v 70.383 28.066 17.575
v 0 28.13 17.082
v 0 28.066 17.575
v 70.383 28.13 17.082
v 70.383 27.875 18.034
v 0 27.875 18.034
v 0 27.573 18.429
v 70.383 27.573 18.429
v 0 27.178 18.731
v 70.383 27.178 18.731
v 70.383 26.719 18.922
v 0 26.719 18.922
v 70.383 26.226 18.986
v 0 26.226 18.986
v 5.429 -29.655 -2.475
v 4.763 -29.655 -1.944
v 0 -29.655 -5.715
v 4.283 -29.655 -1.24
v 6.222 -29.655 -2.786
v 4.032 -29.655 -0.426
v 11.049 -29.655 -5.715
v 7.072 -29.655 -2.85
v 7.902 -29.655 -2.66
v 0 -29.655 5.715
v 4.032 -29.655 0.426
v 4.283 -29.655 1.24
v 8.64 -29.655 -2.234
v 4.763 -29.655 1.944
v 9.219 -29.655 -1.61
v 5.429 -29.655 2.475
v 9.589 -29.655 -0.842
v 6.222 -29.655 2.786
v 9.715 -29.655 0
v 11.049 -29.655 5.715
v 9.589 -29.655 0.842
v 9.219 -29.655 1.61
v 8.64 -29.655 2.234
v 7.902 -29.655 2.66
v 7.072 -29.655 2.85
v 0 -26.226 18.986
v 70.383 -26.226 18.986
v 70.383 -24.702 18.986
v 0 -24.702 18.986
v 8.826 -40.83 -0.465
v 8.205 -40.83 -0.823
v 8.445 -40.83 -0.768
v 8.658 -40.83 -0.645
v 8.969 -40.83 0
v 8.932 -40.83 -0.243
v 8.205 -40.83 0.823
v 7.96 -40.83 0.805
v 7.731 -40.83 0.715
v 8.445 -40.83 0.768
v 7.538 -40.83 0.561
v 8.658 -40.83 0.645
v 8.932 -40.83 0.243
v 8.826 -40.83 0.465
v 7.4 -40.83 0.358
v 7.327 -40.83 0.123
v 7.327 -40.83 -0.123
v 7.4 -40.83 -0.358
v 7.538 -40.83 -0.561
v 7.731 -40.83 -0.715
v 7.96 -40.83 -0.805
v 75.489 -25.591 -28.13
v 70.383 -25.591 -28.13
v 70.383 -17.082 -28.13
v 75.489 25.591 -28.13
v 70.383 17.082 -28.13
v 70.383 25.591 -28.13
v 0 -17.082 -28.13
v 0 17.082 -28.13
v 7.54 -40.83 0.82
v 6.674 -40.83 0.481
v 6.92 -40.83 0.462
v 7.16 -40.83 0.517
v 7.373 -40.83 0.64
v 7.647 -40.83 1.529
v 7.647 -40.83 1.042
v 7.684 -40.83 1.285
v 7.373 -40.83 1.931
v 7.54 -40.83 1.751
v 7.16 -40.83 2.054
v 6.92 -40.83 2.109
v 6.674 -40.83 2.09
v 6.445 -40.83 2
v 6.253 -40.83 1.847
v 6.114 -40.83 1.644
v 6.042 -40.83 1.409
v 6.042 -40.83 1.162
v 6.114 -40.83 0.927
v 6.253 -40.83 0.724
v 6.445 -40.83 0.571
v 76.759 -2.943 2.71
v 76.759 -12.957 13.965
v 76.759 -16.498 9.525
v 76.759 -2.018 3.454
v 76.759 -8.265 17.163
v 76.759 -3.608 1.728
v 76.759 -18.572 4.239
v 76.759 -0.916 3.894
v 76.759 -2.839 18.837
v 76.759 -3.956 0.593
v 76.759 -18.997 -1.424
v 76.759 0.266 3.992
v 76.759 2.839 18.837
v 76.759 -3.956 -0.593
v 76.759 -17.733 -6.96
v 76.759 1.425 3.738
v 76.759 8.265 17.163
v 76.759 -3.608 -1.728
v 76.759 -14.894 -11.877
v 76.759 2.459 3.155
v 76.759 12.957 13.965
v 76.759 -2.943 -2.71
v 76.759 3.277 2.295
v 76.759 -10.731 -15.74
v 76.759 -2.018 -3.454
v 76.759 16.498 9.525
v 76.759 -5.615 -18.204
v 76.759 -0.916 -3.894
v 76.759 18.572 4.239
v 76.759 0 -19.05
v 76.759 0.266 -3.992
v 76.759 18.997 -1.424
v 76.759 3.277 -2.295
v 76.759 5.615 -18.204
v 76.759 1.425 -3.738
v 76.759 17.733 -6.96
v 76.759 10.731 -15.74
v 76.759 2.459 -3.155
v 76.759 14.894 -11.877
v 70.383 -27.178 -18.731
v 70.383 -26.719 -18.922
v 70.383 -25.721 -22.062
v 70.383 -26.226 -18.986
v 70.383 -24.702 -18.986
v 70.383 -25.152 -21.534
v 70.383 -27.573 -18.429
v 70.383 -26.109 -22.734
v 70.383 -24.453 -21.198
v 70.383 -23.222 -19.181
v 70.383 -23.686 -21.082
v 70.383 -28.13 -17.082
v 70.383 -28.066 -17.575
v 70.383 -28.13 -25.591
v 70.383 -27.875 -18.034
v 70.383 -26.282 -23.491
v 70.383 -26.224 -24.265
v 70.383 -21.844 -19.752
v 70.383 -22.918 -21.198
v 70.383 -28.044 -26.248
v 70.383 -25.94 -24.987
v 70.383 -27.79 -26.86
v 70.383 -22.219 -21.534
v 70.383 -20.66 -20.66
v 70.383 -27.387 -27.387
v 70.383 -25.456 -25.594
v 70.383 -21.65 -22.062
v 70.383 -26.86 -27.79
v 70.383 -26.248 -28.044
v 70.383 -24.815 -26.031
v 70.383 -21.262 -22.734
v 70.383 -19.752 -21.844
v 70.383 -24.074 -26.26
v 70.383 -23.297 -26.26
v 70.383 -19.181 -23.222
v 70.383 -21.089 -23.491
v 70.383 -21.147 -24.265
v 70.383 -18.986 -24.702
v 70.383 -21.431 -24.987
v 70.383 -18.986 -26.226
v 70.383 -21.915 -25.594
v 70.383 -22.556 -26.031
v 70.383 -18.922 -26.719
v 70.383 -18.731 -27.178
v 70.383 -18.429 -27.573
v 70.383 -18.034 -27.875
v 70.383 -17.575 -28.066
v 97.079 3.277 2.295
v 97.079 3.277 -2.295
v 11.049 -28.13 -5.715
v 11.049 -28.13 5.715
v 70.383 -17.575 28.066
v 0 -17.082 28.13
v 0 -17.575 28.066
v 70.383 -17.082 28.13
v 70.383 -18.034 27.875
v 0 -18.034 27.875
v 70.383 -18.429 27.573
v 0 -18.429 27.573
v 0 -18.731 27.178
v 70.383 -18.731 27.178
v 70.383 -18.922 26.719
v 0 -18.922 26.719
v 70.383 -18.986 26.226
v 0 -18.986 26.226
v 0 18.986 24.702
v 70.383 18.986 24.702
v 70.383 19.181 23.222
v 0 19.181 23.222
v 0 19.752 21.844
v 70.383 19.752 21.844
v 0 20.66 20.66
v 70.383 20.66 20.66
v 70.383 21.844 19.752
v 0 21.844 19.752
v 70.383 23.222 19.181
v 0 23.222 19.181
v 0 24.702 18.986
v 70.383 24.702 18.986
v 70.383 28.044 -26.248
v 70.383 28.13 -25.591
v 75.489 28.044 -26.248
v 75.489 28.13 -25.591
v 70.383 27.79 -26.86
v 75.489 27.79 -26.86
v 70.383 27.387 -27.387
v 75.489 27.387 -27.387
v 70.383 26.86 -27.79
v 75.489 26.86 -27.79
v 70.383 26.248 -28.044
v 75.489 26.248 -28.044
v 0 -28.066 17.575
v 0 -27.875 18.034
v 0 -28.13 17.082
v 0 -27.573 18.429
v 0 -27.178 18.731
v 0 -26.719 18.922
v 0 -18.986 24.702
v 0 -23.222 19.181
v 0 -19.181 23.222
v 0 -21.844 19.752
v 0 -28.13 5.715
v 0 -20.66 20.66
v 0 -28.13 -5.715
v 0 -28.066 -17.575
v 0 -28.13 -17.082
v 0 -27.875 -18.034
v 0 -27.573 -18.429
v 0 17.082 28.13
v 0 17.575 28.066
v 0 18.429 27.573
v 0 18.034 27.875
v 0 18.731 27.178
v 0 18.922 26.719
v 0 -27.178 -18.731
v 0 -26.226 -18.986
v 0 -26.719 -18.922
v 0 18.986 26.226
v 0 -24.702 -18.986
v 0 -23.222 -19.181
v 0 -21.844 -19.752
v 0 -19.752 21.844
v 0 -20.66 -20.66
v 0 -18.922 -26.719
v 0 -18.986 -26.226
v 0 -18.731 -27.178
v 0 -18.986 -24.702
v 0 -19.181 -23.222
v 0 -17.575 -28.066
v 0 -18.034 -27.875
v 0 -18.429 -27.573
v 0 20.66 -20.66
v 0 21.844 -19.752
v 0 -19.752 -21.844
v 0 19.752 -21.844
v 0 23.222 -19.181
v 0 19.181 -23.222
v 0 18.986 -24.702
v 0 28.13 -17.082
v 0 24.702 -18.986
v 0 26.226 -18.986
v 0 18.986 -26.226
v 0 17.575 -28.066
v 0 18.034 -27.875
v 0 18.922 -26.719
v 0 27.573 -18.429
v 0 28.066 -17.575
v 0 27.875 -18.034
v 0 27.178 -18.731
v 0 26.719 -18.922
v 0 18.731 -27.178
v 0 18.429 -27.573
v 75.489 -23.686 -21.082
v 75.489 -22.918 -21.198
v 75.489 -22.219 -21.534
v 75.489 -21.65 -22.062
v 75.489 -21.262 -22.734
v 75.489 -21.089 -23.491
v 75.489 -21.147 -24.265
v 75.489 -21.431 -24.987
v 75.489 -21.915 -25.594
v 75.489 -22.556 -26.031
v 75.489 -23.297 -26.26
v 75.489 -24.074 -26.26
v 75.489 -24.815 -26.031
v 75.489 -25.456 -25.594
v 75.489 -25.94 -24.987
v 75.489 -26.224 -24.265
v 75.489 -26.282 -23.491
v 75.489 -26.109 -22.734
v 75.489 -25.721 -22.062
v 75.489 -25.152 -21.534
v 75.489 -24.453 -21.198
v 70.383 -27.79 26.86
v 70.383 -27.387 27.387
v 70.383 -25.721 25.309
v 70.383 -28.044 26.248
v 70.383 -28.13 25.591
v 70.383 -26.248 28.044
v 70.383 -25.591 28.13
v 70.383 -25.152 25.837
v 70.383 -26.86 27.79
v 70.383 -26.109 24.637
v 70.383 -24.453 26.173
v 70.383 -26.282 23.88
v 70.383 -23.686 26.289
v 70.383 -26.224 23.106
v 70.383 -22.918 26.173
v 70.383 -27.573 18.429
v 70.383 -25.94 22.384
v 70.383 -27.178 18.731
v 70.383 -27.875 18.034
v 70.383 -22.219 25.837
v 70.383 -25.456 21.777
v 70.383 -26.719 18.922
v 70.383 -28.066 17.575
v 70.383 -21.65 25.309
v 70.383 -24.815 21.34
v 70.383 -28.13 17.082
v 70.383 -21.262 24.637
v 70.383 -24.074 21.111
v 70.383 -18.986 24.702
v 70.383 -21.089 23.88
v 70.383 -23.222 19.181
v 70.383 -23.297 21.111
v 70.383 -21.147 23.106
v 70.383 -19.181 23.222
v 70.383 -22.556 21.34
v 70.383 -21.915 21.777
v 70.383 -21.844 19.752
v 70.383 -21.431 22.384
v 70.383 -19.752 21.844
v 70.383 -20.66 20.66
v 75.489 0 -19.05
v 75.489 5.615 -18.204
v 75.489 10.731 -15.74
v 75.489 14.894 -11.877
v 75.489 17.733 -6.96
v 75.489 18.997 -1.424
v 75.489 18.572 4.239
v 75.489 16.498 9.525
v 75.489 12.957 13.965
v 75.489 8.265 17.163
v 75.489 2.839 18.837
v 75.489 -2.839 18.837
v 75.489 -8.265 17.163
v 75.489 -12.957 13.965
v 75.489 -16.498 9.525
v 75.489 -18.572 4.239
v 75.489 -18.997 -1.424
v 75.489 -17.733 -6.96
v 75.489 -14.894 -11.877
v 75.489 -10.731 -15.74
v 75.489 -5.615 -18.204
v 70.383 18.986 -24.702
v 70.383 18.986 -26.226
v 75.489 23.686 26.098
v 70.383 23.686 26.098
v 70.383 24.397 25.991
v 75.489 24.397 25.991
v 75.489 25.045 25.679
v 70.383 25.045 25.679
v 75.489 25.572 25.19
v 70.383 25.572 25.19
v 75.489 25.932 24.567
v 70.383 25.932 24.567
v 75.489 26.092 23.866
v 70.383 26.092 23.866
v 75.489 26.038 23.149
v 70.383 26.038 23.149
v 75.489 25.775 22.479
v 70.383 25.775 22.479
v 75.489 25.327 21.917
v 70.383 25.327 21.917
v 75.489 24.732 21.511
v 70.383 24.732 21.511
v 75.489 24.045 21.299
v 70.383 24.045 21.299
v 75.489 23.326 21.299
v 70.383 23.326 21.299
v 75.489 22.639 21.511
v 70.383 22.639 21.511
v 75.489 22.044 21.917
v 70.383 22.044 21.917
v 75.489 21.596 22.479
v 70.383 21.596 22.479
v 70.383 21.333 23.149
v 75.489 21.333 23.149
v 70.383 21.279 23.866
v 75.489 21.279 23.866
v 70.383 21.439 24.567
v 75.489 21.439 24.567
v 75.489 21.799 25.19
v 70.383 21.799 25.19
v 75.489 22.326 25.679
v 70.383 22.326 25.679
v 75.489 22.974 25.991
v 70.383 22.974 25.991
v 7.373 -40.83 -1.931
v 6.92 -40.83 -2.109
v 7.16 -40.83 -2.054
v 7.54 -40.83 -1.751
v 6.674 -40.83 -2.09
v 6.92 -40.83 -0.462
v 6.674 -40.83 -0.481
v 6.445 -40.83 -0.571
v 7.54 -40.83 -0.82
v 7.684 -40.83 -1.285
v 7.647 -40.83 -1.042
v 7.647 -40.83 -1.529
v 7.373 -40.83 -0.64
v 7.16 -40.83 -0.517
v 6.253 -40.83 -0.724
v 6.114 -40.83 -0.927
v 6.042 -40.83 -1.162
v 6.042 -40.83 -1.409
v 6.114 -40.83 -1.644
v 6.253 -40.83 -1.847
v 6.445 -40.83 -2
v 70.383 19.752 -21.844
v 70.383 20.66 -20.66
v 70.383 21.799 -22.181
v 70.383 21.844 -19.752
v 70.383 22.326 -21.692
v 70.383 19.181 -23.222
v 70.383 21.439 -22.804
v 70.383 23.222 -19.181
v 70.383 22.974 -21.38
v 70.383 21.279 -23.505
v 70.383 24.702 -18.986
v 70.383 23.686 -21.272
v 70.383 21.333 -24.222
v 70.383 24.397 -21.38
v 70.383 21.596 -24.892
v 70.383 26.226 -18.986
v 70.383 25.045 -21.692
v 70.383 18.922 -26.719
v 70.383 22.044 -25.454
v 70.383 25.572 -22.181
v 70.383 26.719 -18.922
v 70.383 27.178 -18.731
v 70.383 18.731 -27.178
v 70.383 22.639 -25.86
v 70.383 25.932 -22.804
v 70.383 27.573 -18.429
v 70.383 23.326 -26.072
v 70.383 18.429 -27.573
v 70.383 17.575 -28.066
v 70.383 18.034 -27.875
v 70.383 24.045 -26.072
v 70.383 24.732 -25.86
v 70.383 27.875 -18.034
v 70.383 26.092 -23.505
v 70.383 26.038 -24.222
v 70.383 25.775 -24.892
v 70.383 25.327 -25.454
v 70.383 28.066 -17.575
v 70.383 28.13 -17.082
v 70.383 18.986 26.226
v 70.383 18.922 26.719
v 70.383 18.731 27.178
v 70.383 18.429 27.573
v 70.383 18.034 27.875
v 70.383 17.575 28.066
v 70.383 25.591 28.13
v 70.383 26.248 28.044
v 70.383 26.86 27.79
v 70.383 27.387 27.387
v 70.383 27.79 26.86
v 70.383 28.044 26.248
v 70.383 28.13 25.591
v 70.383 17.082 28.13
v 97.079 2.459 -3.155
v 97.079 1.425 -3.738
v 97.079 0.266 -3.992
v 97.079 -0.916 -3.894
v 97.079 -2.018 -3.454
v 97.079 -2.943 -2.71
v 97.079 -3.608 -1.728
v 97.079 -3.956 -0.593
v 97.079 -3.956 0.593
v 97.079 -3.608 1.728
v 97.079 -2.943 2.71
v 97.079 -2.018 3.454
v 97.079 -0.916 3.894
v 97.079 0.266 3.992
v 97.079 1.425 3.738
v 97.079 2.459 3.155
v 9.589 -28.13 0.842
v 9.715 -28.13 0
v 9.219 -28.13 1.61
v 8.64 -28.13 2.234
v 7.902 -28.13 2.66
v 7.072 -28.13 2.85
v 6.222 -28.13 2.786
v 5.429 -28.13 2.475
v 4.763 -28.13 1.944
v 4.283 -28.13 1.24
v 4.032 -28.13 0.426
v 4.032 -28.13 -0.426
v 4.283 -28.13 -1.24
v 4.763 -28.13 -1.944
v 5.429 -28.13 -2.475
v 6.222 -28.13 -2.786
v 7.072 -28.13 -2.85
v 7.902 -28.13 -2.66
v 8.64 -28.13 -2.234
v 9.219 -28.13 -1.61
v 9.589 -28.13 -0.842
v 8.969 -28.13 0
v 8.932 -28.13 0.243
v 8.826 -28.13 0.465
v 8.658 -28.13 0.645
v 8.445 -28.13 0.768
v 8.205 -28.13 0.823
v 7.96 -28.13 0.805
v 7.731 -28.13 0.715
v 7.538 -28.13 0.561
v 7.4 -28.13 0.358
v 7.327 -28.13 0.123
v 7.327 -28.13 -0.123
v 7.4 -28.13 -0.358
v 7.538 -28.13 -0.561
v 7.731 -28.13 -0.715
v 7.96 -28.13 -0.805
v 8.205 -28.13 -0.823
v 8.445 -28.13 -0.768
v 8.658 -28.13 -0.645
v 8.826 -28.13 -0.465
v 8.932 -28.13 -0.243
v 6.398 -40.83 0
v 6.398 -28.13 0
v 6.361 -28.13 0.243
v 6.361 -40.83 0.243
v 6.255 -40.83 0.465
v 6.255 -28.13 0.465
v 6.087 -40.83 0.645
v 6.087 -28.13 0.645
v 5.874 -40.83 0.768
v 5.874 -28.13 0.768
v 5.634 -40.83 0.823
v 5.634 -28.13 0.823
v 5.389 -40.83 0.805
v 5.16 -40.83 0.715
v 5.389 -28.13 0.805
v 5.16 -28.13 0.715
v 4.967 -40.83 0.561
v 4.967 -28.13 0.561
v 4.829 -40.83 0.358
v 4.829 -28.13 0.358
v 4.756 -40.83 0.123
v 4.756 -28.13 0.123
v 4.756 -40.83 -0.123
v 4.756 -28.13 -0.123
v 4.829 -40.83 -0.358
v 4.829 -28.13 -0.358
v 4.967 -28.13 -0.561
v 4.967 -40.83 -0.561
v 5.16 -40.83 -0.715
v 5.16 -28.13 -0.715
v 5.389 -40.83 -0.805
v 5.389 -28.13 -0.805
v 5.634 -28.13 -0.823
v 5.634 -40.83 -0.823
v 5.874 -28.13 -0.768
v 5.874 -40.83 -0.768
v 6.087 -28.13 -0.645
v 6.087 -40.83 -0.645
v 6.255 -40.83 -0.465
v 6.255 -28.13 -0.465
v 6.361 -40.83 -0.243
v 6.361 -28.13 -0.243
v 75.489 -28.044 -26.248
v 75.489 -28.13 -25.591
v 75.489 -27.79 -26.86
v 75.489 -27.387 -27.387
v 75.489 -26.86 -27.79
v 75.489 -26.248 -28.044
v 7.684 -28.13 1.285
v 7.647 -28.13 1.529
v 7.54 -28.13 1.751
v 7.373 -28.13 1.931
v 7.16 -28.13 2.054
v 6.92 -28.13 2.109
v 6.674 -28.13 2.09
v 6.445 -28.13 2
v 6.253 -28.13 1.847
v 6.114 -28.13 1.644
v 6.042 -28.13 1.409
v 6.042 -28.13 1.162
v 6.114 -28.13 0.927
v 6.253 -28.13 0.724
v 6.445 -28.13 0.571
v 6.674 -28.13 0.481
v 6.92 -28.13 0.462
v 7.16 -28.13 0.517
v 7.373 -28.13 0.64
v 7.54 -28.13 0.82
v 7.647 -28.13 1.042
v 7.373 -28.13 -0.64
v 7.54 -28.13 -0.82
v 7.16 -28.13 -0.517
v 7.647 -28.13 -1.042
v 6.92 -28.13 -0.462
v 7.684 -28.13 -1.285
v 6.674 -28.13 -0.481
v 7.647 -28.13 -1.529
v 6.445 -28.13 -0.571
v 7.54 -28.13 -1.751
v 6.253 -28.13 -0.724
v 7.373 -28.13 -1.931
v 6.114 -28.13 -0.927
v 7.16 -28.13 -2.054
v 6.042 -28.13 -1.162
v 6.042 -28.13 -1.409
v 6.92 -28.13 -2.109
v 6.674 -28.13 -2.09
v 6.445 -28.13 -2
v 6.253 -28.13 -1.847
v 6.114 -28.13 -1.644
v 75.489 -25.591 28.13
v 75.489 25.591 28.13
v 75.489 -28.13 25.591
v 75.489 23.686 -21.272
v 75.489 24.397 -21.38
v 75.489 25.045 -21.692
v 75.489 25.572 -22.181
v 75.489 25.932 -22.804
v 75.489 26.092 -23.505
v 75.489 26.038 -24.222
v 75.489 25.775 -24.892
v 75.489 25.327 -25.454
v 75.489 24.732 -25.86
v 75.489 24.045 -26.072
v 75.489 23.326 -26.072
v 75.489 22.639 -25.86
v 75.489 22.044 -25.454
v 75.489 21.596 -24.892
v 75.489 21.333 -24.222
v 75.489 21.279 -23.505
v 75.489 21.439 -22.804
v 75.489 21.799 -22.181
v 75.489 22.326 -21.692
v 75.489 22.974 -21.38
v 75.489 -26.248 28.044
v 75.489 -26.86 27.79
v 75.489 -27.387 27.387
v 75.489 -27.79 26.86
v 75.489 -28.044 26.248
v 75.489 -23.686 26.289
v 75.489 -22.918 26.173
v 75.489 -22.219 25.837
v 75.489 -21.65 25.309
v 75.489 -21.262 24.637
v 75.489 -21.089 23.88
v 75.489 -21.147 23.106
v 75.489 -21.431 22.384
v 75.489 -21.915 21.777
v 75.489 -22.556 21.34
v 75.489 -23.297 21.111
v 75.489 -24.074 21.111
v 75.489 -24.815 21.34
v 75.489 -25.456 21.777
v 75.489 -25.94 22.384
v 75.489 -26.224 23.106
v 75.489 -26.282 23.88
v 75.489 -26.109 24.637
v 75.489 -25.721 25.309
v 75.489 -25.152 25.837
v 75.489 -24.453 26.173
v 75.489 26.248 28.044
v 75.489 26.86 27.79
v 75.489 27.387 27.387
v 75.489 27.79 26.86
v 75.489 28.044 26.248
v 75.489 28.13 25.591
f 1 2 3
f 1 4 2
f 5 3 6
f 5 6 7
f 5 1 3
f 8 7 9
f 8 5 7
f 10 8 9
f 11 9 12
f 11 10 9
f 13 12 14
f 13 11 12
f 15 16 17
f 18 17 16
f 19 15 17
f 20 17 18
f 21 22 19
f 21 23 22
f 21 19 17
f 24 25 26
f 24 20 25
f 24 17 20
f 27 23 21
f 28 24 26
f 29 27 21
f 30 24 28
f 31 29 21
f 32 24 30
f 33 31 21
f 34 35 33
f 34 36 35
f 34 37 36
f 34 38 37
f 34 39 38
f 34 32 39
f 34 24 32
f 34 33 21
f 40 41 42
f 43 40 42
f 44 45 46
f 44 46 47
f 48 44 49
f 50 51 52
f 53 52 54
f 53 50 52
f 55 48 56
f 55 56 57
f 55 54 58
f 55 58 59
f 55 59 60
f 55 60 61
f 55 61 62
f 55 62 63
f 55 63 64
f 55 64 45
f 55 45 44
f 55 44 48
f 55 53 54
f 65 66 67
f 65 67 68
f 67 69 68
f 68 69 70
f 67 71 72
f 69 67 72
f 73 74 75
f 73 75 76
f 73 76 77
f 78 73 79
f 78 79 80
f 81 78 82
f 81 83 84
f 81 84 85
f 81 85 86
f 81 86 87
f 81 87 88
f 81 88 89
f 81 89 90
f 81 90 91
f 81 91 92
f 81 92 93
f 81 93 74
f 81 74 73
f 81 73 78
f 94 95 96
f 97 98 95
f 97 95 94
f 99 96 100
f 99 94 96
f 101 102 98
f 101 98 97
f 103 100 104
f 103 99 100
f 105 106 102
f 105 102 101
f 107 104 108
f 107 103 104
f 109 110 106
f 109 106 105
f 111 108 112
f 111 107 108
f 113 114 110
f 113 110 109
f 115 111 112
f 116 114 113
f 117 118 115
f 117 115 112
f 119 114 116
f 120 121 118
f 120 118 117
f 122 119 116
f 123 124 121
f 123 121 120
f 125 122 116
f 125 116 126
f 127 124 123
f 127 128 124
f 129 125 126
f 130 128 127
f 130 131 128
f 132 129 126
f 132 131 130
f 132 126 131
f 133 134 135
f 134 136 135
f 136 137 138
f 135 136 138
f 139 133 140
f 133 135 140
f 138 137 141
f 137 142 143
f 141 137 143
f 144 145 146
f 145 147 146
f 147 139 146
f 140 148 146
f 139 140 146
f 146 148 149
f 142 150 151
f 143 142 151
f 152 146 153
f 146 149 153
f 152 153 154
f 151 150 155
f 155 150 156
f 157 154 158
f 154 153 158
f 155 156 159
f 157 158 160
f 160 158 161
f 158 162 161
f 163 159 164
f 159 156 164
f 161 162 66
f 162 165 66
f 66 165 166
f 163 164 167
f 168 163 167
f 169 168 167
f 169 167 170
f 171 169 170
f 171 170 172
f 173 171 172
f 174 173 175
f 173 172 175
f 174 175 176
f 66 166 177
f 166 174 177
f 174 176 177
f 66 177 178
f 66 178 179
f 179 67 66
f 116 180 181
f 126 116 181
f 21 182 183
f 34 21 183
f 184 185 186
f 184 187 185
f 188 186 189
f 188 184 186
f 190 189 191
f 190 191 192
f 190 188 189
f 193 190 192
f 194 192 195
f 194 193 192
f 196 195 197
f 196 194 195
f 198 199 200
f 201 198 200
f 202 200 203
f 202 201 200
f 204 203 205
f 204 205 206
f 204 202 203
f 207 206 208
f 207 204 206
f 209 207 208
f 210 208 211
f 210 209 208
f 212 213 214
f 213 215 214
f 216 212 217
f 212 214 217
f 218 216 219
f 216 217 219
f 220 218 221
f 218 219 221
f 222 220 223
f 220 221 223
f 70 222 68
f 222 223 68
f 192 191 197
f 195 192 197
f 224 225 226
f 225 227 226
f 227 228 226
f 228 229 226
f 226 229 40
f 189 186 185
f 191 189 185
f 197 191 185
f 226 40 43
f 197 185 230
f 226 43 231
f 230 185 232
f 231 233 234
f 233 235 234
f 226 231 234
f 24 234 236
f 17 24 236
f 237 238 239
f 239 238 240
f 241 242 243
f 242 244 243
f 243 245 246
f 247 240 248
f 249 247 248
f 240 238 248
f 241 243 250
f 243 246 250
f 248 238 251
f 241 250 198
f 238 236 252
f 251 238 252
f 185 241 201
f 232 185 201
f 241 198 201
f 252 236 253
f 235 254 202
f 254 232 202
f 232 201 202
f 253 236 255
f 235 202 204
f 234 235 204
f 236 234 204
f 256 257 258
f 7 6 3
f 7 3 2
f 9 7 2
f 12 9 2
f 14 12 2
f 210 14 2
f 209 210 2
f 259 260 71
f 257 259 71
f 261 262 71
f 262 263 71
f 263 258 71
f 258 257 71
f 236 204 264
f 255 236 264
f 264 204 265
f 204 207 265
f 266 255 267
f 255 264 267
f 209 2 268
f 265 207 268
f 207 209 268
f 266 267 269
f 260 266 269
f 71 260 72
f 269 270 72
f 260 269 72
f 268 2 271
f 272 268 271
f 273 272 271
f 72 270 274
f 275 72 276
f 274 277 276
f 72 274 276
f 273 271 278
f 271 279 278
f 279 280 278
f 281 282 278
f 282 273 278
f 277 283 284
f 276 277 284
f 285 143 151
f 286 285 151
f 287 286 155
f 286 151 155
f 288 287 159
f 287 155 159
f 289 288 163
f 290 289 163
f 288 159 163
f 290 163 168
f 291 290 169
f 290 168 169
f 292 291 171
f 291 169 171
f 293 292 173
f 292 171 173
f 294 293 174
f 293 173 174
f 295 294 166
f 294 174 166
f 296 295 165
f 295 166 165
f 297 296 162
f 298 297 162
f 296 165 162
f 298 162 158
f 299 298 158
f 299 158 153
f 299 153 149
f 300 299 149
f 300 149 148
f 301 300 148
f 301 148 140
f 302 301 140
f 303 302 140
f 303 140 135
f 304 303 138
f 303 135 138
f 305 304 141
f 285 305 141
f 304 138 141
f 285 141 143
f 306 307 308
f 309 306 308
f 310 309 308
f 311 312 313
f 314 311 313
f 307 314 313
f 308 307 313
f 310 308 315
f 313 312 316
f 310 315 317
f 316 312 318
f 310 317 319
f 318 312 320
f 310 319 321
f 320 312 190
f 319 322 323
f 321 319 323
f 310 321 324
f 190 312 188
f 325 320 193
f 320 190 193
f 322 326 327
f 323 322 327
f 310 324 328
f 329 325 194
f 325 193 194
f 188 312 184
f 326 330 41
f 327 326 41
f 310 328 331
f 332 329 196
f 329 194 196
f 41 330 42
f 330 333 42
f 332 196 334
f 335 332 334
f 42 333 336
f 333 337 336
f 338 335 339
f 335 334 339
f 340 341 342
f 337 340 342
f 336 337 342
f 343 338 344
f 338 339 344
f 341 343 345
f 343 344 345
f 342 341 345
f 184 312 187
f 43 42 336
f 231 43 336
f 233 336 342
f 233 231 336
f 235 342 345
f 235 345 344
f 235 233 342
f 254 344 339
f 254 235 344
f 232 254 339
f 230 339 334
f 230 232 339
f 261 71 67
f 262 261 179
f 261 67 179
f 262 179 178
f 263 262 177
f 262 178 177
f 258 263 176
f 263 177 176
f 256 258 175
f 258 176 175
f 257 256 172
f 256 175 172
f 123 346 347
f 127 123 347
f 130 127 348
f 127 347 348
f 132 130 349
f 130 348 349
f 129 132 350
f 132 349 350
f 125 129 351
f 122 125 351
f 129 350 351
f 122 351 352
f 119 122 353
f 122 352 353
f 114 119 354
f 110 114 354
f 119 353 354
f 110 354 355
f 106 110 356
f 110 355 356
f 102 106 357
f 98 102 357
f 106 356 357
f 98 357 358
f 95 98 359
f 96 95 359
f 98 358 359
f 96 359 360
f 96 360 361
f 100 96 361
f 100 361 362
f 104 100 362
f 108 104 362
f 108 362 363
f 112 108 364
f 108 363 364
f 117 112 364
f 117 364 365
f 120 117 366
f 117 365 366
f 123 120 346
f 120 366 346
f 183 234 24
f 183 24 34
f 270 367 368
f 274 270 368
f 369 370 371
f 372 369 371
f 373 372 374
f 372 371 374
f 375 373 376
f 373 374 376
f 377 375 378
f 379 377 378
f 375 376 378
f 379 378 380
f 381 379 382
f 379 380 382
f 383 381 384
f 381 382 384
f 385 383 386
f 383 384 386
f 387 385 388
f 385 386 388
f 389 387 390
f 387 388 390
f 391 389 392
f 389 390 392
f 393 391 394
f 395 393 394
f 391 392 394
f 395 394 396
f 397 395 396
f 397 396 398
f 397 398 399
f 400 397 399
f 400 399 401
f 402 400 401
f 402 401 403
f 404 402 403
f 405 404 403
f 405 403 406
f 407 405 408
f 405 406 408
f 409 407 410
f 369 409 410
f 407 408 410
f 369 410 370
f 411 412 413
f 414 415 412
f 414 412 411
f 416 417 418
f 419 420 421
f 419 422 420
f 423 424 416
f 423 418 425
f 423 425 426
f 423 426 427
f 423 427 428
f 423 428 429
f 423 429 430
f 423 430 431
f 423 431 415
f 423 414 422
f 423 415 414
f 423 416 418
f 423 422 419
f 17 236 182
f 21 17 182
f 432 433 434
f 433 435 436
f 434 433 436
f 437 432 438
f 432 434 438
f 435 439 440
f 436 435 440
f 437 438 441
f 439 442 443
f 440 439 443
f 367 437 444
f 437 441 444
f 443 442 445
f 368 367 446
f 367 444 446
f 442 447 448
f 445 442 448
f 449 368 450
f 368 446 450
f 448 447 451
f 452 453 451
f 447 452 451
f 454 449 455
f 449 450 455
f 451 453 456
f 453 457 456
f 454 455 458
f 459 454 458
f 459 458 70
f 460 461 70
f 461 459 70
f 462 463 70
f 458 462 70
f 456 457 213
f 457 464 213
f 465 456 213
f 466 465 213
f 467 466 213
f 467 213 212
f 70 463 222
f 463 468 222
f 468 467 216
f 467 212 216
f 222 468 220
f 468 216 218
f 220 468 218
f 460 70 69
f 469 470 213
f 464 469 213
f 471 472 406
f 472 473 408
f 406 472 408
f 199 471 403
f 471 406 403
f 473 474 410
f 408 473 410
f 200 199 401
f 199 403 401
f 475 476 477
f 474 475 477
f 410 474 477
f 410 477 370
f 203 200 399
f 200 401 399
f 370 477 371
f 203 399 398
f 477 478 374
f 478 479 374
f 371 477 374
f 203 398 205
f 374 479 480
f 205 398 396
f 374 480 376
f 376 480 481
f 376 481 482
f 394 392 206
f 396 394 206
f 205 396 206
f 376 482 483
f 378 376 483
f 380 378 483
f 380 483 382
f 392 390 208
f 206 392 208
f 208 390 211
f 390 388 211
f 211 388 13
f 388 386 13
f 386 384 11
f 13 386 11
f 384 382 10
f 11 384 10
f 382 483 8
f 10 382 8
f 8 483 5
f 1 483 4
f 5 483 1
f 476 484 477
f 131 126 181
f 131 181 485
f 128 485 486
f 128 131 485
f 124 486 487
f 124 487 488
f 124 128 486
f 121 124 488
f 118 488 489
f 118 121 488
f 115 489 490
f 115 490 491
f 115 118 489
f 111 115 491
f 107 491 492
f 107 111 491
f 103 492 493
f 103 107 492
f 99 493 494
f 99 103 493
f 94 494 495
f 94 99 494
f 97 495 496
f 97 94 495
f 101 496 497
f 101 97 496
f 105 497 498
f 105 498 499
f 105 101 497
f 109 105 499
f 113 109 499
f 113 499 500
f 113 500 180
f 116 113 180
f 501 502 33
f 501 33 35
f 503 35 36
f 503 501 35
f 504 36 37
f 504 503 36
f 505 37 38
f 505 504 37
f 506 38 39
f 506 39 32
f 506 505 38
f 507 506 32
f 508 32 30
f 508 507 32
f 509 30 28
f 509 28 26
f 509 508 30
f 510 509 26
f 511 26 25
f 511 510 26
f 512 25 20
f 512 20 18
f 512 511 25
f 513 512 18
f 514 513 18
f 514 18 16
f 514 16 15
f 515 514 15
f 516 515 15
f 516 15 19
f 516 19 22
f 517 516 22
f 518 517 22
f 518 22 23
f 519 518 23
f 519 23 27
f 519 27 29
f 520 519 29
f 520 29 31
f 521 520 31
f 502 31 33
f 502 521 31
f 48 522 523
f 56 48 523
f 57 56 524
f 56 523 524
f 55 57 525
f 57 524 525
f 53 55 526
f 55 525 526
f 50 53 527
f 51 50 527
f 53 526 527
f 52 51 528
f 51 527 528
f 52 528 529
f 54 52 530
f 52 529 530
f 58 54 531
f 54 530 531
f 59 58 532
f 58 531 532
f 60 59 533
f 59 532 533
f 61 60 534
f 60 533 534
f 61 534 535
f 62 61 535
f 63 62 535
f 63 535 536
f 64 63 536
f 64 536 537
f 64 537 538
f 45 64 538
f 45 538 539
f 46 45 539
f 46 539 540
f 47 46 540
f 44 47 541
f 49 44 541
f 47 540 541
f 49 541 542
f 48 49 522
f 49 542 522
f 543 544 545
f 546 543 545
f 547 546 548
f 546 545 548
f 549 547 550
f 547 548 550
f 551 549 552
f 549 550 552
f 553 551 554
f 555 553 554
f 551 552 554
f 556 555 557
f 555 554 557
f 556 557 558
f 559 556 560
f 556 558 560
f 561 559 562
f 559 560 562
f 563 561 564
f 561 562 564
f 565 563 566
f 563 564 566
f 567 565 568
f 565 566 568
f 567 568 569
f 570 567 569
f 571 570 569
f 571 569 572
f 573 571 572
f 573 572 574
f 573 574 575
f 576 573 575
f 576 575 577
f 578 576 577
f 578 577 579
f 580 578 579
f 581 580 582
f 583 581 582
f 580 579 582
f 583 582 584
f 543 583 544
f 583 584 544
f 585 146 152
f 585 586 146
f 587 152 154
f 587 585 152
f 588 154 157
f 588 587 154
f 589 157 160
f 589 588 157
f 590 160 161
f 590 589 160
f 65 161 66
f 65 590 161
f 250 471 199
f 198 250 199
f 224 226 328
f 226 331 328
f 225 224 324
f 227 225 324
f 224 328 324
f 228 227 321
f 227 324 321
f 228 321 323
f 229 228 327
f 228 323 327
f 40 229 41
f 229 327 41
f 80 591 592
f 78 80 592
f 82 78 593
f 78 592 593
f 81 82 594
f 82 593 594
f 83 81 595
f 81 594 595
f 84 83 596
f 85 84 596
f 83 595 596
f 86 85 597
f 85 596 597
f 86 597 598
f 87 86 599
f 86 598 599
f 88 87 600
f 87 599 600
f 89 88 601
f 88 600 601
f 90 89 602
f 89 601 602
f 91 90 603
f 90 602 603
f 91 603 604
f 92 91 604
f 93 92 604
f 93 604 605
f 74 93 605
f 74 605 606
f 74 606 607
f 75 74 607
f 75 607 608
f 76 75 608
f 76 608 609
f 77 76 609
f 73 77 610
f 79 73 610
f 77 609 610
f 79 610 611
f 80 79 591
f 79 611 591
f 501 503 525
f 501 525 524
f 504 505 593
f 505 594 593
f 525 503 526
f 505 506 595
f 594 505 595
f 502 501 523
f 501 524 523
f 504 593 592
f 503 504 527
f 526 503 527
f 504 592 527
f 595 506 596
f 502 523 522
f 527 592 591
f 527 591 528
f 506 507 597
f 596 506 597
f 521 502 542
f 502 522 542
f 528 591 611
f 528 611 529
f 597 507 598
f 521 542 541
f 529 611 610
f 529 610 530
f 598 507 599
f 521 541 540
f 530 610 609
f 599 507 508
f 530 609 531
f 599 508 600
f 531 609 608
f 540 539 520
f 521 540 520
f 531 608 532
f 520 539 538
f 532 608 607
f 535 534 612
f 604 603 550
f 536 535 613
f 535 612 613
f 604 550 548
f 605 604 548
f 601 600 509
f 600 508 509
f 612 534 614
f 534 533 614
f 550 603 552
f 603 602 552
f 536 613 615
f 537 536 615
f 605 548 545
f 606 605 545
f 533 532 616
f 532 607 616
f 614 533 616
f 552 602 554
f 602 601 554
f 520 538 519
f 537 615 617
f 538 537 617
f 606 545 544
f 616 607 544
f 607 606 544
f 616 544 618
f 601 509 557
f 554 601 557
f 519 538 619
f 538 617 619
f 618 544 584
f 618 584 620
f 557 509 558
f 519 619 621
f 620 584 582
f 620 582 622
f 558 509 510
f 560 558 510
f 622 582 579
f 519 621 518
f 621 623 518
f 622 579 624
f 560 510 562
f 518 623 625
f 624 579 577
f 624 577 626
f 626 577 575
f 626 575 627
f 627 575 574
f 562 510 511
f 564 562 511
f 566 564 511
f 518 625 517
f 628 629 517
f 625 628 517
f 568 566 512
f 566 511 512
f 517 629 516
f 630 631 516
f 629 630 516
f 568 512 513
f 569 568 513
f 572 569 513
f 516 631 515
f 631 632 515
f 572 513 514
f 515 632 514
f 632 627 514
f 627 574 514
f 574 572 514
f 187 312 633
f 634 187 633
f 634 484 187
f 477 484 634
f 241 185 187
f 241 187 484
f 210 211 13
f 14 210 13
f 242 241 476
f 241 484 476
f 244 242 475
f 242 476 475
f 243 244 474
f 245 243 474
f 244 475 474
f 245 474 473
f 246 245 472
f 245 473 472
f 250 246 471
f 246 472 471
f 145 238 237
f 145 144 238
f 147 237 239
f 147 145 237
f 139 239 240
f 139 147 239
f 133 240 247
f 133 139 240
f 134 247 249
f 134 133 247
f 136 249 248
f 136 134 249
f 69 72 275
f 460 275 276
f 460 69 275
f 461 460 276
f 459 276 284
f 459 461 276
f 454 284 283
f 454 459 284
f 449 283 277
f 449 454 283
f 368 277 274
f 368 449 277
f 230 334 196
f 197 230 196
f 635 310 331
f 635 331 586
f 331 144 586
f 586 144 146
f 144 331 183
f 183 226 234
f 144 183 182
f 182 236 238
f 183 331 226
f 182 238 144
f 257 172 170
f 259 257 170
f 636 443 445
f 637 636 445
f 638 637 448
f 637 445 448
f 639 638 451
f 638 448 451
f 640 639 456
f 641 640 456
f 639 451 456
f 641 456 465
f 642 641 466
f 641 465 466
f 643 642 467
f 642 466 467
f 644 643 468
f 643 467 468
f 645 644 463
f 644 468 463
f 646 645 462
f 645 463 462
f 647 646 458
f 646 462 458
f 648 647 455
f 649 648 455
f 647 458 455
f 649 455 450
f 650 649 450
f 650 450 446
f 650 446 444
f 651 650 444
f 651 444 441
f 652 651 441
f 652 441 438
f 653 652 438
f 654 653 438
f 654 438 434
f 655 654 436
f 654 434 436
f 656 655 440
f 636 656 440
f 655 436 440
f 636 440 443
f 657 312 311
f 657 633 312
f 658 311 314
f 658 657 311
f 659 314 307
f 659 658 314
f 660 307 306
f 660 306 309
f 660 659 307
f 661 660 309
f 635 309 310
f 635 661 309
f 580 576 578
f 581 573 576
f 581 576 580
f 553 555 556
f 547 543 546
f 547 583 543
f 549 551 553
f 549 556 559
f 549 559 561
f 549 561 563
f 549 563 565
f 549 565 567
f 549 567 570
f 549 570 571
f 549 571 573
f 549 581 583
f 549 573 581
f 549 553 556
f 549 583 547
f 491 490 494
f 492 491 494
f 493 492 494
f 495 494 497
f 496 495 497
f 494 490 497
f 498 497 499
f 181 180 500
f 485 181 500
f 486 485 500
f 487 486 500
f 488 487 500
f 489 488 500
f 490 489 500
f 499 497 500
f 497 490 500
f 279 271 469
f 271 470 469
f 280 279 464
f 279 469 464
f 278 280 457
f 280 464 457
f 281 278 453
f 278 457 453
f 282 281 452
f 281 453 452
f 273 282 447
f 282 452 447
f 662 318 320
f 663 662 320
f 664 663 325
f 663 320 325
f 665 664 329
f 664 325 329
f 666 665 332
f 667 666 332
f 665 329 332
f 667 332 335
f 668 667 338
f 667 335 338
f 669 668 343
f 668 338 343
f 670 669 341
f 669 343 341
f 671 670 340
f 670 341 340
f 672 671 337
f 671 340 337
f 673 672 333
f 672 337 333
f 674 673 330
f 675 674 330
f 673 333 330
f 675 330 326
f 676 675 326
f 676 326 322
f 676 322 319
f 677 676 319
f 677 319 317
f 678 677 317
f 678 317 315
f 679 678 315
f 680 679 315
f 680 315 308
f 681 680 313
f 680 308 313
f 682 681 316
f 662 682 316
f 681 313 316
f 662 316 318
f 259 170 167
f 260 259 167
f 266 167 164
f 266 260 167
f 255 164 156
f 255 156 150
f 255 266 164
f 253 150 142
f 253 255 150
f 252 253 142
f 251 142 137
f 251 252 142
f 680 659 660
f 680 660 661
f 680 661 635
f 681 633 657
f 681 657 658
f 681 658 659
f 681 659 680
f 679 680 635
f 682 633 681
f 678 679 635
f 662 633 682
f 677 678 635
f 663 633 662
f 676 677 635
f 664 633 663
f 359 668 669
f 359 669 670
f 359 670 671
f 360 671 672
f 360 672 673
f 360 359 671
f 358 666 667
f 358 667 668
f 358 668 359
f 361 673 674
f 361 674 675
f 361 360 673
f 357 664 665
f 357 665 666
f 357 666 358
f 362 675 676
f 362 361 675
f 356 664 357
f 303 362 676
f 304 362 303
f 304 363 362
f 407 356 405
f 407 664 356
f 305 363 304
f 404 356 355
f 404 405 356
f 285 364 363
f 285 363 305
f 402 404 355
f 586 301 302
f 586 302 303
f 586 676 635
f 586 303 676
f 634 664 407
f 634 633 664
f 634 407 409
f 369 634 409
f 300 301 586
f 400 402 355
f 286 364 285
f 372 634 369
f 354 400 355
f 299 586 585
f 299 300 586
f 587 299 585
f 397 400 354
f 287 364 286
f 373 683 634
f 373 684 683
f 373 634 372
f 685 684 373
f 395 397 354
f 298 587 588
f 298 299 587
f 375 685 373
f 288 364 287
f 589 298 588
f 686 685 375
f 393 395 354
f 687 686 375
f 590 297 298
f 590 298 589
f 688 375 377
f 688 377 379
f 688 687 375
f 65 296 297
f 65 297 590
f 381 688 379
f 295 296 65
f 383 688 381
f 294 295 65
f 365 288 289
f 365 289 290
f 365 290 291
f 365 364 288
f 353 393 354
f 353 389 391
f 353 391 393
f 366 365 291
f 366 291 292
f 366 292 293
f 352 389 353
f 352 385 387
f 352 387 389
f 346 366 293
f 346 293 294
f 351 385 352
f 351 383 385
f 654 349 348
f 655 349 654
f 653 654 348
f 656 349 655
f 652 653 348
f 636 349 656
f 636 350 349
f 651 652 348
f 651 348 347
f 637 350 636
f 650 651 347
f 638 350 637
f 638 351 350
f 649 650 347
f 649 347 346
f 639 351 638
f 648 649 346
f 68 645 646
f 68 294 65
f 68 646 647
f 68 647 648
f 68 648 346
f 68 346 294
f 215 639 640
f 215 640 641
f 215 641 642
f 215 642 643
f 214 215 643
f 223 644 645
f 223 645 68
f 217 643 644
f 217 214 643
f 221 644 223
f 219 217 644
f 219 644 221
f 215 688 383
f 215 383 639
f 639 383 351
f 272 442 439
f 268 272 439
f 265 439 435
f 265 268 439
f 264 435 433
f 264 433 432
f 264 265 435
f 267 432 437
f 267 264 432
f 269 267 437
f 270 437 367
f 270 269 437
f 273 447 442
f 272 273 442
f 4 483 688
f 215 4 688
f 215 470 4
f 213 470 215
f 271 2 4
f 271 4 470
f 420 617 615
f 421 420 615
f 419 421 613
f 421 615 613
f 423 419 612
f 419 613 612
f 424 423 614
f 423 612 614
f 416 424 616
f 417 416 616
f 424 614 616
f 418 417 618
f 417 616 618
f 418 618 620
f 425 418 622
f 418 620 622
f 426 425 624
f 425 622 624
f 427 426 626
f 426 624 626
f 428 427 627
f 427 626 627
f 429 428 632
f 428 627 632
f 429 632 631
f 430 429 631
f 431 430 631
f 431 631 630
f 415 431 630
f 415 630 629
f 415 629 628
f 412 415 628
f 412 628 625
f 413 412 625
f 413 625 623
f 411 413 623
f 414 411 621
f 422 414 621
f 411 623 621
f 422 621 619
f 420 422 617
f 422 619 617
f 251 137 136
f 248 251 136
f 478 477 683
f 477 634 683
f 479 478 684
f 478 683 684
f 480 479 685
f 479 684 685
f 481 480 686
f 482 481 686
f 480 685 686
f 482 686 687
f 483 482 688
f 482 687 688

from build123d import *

# Parameters (mm, degrees)
SKETCH1_W           = 56.261
SKETCH1_H           = 56.261
BOSS_EXTRUDE2_DEPTH = 75.4888
SKETCH2_R           = 19.05
BOSS_EXTRUDE3_DEPTH = 1.27
CUT_EXTRUDE1_DEPTH  = 70.3834
FILLET1_R           = 2.54
FILLET2_R           = 1.905
SKETCH4_R           = 2.413
SKETCH4_R_2         = 2.6035
CUT_EXTRUDE2_DEPTH  = 5.1054
BOSS_EXTRUDE4_DEPTH = 20.32
SKETCH6_W           = 11.049
SKETCH6_H           = 11.43
SKETCH6_R           = 2.8575
BOSS_EXTRUDE5_DEPTH = 1.524
SKETCH7_R           = 0.8255
BOSS_EXTRUDE6_DEPTH = 12.7


with BuildPart() as part:
    # Sketch1 → Boss-Extrude2 (new body)
    with BuildSketch(Plane(origin=(0, 0, 0), x_dir=(0, 0, -1), z_dir=(1, 0, 0))):
        Rectangle(SKETCH1_W, SKETCH1_H)
    extrude(amount=BOSS_EXTRUDE2_DEPTH)

    # Sketch2 → Boss-Extrude3 (add)
    with BuildSketch(Plane(origin=(75.4888, 0, 0), x_dir=(0, 0, -1), z_dir=(1, 0, 0))):
        Circle(SKETCH2_R)
    extrude(amount=BOSS_EXTRUDE3_DEPTH)

    # Sketch3 → Cut-Extrude1 (cut)
    with BuildSketch(Plane.ZY):
        with BuildLine():
            Line((28.1305, 18.9865), (24.7015, 18.9865))
            ThreePointArc((24.7015, 18.9865), (20.660384746, 20.660384746), (18.9865, 24.7015))
            Line((18.9865, 24.7015), (18.9865, 28.1305))
            Line((18.9865, 28.1305), (28.1305, 28.1305))
            Line((28.1305, 28.1305), (28.1305, 18.9865))
        make_face()
        with BuildLine():
            Line((-28.1305, 28.1305), (-18.9865, 28.1305))
            Line((-18.9865, 28.1305), (-18.9865, 24.7015))
            ThreePointArc((-18.9865, 24.7015), (-20.660384746, 20.660384746), (-24.7015, 18.9865))
            Line((-24.7015, 18.9865), (-28.1305, 18.9865))
            Line((-28.1305, 18.9865), (-28.1305, 28.1305))
        make_face()
        with BuildLine():
            Line((18.9865, -28.1305), (18.9865, -24.7015))
            ThreePointArc((18.9865, -24.7015), (20.660384746, -20.660384746), (24.7015, -18.9865))
            Line((24.7015, -18.9865), (28.1305, -18.9865))
            Line((28.1305, -18.9865), (28.1305, -28.1305))
            Line((28.1305, -28.1305), (18.9865, -28.1305))
        make_face()
        with BuildLine():
            Line((-28.1305, -18.9865), (-24.7015, -18.9865))
            ThreePointArc((-24.7015, -18.9865), (-20.660384746, -20.660384746), (-18.9865, -24.7015))
            Line((-18.9865, -24.7015), (-18.9865, -28.1305))
            Line((-18.9865, -28.1305), (-28.1305, -28.1305))
            Line((-28.1305, -28.1305), (-28.1305, -18.9865))
        make_face()
    extrude(amount=-CUT_EXTRUDE1_DEPTH, mode=Mode.SUBTRACT)

    # Fillet1
    fillet1_edges = [part.edges().sort_by_distance(p)[0] for p in [
        (72.9361, -28.1305, -28.1305),
        (72.9361, -28.1305, 28.1305),
        (72.9361, 28.1305, 28.1305),
        (72.9361, 28.1305, -28.1305),
    ]]
    fillet(fillet1_edges, radius=FILLET1_R)

    # Fillet2
    fillet2_edges = [part.edges().sort_by_distance(p)[0] for p in [
        (35.1917, -28.1305, -18.9865),
        (35.1917, -18.9865, -28.1305),
        (35.1917, -18.9865, 28.1305),
        (35.1917, -28.1305, 18.9865),
        (35.1917, 28.1305, 18.9865),
        (35.1917, 18.9865, 28.1305),
        (35.1917, 18.9865, -28.1305),
        (35.1917, 28.1305, -18.9865),
    ]]
    fillet(fillet2_edges, radius=FILLET2_R)

    # Sketch4 → Cut-Extrude2 (cut)
    with BuildSketch(Plane.ZY.offset(-70.3834)):
        with Locations((-23.6855, 23.6855)):
            Circle(SKETCH4_R)
        with Locations((23.6855, 23.6855)):
            Circle(SKETCH4_R)
        with Locations((23.6855, -23.6855)):
            Circle(SKETCH4_R_2)
        with Locations((-23.6855, -23.6855)):
            Circle(SKETCH4_R_2)
    extrude(amount=-CUT_EXTRUDE2_DEPTH, mode=Mode.SUBTRACT)

    # Sketch5 → Boss-Extrude4 (add)
    with BuildSketch(Plane(origin=(76.7588, 0, 0), x_dir=(0, 0, -1), z_dir=(1, 0, 0))):
        with BuildLine():
            Line((-2.295189031, 3.2766), (2.295189031, 3.2766))
            ThreePointArc((2.295189031, 3.2766), (0, -4.0005), (-2.295189031, 3.2766))
        make_face()
    extrude(amount=BOSS_EXTRUDE4_DEPTH)

    # Sketch6 → Boss-Extrude5 (add)
    with BuildSketch(Plane.XZ.offset(28.1305)):
        with Locations((5.5245, 0)):
            Rectangle(SKETCH6_W, SKETCH6_H)
        with Locations((6.858, 0)):
            Circle(SKETCH6_R, mode=Mode.SUBTRACT)
    extrude(amount=BOSS_EXTRUDE5_DEPTH)

    # Sketch7 → Boss-Extrude6 (add)
    with BuildSketch(Plane.XZ.offset(28.1305)):
        with Locations((6.858, 1.285488676)):
            Circle(SKETCH7_R)
        with Locations((8.143488676, 0)):
            Circle(SKETCH7_R)
        with Locations((6.858, -1.285488676)):
            Circle(SKETCH7_R)
        with Locations((5.572511324, 0)):
            Circle(SKETCH7_R)
    extrude(amount=BOSS_EXTRUDE6_DEPTH)


solid = part.part
